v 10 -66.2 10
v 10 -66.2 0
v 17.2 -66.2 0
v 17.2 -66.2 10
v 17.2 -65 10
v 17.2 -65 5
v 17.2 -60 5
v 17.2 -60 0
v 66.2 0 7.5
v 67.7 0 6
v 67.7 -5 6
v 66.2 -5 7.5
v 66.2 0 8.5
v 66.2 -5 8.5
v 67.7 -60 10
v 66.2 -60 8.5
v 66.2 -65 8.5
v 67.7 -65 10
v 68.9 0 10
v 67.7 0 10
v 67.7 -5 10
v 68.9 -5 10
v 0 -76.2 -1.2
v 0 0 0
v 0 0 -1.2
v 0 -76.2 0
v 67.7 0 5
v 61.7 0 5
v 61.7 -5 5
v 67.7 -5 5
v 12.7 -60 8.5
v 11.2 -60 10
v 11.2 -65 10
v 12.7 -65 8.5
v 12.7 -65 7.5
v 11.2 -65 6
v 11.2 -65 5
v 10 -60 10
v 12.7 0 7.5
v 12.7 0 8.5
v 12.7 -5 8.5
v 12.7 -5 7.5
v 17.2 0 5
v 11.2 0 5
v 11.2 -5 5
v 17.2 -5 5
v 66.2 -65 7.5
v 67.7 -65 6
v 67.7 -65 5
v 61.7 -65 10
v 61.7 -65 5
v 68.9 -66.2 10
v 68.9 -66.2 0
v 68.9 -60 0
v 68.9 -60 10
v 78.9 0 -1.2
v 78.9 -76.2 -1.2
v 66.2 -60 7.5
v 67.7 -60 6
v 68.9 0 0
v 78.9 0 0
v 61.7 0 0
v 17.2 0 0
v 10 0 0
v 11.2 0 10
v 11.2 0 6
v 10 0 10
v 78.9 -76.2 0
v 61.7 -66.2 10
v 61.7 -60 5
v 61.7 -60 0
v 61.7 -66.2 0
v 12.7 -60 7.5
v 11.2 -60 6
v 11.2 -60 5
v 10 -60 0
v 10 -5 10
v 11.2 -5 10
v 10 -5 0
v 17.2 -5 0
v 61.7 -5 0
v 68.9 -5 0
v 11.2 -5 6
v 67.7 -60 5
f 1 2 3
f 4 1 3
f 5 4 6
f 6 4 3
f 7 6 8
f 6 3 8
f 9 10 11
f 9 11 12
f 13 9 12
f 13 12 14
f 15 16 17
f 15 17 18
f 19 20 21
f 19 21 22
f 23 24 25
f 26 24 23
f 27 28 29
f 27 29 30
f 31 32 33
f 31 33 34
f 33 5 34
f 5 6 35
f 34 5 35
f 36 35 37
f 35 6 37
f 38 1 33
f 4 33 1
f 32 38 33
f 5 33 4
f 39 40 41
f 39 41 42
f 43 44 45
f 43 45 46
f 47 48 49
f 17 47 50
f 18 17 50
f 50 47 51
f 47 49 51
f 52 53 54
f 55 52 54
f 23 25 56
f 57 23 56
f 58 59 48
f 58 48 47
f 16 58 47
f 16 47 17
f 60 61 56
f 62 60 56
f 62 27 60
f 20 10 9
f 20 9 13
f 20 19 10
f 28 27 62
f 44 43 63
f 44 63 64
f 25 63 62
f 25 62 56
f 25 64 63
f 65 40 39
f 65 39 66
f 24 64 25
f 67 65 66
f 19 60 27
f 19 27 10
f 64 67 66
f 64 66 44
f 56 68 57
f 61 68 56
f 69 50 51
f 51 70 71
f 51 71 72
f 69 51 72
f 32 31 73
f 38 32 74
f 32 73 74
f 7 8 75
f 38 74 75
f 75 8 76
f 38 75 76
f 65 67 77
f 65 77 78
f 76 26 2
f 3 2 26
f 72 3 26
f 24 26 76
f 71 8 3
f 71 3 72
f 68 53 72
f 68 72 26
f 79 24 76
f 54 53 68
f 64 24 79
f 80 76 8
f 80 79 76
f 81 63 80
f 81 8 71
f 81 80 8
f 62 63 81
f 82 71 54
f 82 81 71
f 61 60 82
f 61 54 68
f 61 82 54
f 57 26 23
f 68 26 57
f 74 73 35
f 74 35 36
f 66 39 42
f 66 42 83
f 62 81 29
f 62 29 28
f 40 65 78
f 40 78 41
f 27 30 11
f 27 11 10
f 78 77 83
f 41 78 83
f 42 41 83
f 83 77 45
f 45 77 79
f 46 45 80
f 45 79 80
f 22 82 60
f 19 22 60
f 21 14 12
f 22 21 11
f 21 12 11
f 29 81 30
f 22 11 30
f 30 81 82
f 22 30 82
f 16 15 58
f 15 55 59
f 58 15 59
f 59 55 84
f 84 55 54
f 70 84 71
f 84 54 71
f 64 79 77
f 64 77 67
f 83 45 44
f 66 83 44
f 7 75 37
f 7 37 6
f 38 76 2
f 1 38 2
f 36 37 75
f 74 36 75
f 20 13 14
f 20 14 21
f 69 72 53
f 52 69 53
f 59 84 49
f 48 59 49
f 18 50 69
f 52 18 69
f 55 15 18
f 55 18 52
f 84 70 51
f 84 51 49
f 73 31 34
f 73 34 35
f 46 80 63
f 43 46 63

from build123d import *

# Parameters (mm, degrees)
F0_W     = 6
F0_H     = 5
F0_W_2   = 1.2
F1_DEPTH = 1.2
F2_DEPTH = 5
F3_DEPTH = 10
F5_DEPTH = 65
F6_DEPTH = 10


with BuildPart() as f1:
    # F0 (on Top) → F1 (new body)
    with BuildSketch(Plane.XY):
        with Locations((14.2, -2.5)):
            Rectangle(F0_W, F0_H)
        with Locations((10.6, -2.5)):
            Rectangle(F0_W_2, F0_H)
        Polygon((10, 0), (0, 0), (0, -76.2), (78.9, -76.2), (78.9, 0), (68.9, 0), (68.9, -5), (67.7, -5), (61.7, -5), (61.7, 0), (17.2, 0), (17.2, -5), (11.2, -5), (10, -5), align=None)
        Polygon((10, -60), (11.2, -60), (17.2, -60), (17.2, -65), (17.2, -66.2), (10, -66.2), align=None, mode=Mode.SUBTRACT)
        Polygon((61.7, -65), (61.7, -60), (67.7, -60), (68.9, -60), (68.9, -66.2), (61.7, -66.2), align=None, mode=Mode.SUBTRACT)
        with Locations((64.7, -2.5)):
            Rectangle(F0_W, F0_H)
        with Locations((68.3, -2.5)):
            Rectangle(F0_W_2, F0_H)
        with Locations((64.7, -62.5)):
            Rectangle(F0_W, F0_H)
        Polygon((68.9, -60), (67.7, -60), (67.7, -65), (61.7, -65), (61.7, -66.2), (68.9, -66.2), align=None)
        with Locations((14.2, -62.5)):
            Rectangle(F0_W, F0_H)
        Polygon((11.2, -65), (11.2, -60), (10, -60), (10, -66.2), (17.2, -66.2), (17.2, -65), align=None)
    extrude(amount=-F1_DEPTH)

    # F0 (on Top) → F2 (join)
    with BuildSketch(Plane.XY):
        with Locations((14.2, -2.5)):
            Rectangle(F0_W, F0_H)
        with Locations((14.2, -62.5)):
            Rectangle(F0_W, F0_H)
        with Locations((64.7, -2.5)):
            Rectangle(F0_W, F0_H)
        with Locations((64.7, -62.5)):
            Rectangle(F0_W, F0_H)
    extrude(amount=F2_DEPTH)

    # F0 (on Top) → F3 (join)
    with BuildSketch(Plane.XY):
        Polygon((11.2, -65), (11.2, -60), (10, -60), (10, -66.2), (17.2, -66.2), (17.2, -65), align=None)
        Polygon((68.9, -60), (67.7, -60), (67.7, -65), (61.7, -65), (61.7, -66.2), (68.9, -66.2), align=None)
        with Locations((68.3, -2.5)):
            Rectangle(F0_W_2, F0_H)
        with Locations((10.6, -2.5)):
            Rectangle(F0_W_2, F0_H)
    extrude(amount=F3_DEPTH)

    # F4 (on face) → F5 (join, through all)
    with BuildSketch(Plane(origin=(0, 0, 0), x_dir=(-1, 0, 0), z_dir=(0, 1, 0))):
        Polygon((-11.2, 6), (-11.2, 10), (-12.7, 8.5), (-12.7, 7.5), align=None)
        Polygon((-66.2, 7.5), (-66.2, 8.5), (-67.7, 10), (-67.7, 6), align=None)
    extrude(amount=-F5_DEPTH)

    # F0 (on Top) → F6 (cut, through all)
    with BuildSketch(Plane.XY):
        Polygon((10, 0), (0, 0), (0, -76.2), (78.9, -76.2), (78.9, 0), (68.9, 0), (68.9, -5), (67.7, -5), (61.7, -5), (61.7, 0), (17.2, 0), (17.2, -5), (11.2, -5), (10, -5), align=None)
        Polygon((10, -60), (11.2, -60), (17.2, -60), (17.2, -65), (17.2, -66.2), (10, -66.2), align=None, mode=Mode.SUBTRACT)
        Polygon((61.7, -65), (61.7, -60), (67.7, -60), (68.9, -60), (68.9, -66.2), (61.7, -66.2), align=None, mode=Mode.SUBTRACT)
    extrude(amount=F6_DEPTH, mode=Mode.SUBTRACT)


solid = f1.part
